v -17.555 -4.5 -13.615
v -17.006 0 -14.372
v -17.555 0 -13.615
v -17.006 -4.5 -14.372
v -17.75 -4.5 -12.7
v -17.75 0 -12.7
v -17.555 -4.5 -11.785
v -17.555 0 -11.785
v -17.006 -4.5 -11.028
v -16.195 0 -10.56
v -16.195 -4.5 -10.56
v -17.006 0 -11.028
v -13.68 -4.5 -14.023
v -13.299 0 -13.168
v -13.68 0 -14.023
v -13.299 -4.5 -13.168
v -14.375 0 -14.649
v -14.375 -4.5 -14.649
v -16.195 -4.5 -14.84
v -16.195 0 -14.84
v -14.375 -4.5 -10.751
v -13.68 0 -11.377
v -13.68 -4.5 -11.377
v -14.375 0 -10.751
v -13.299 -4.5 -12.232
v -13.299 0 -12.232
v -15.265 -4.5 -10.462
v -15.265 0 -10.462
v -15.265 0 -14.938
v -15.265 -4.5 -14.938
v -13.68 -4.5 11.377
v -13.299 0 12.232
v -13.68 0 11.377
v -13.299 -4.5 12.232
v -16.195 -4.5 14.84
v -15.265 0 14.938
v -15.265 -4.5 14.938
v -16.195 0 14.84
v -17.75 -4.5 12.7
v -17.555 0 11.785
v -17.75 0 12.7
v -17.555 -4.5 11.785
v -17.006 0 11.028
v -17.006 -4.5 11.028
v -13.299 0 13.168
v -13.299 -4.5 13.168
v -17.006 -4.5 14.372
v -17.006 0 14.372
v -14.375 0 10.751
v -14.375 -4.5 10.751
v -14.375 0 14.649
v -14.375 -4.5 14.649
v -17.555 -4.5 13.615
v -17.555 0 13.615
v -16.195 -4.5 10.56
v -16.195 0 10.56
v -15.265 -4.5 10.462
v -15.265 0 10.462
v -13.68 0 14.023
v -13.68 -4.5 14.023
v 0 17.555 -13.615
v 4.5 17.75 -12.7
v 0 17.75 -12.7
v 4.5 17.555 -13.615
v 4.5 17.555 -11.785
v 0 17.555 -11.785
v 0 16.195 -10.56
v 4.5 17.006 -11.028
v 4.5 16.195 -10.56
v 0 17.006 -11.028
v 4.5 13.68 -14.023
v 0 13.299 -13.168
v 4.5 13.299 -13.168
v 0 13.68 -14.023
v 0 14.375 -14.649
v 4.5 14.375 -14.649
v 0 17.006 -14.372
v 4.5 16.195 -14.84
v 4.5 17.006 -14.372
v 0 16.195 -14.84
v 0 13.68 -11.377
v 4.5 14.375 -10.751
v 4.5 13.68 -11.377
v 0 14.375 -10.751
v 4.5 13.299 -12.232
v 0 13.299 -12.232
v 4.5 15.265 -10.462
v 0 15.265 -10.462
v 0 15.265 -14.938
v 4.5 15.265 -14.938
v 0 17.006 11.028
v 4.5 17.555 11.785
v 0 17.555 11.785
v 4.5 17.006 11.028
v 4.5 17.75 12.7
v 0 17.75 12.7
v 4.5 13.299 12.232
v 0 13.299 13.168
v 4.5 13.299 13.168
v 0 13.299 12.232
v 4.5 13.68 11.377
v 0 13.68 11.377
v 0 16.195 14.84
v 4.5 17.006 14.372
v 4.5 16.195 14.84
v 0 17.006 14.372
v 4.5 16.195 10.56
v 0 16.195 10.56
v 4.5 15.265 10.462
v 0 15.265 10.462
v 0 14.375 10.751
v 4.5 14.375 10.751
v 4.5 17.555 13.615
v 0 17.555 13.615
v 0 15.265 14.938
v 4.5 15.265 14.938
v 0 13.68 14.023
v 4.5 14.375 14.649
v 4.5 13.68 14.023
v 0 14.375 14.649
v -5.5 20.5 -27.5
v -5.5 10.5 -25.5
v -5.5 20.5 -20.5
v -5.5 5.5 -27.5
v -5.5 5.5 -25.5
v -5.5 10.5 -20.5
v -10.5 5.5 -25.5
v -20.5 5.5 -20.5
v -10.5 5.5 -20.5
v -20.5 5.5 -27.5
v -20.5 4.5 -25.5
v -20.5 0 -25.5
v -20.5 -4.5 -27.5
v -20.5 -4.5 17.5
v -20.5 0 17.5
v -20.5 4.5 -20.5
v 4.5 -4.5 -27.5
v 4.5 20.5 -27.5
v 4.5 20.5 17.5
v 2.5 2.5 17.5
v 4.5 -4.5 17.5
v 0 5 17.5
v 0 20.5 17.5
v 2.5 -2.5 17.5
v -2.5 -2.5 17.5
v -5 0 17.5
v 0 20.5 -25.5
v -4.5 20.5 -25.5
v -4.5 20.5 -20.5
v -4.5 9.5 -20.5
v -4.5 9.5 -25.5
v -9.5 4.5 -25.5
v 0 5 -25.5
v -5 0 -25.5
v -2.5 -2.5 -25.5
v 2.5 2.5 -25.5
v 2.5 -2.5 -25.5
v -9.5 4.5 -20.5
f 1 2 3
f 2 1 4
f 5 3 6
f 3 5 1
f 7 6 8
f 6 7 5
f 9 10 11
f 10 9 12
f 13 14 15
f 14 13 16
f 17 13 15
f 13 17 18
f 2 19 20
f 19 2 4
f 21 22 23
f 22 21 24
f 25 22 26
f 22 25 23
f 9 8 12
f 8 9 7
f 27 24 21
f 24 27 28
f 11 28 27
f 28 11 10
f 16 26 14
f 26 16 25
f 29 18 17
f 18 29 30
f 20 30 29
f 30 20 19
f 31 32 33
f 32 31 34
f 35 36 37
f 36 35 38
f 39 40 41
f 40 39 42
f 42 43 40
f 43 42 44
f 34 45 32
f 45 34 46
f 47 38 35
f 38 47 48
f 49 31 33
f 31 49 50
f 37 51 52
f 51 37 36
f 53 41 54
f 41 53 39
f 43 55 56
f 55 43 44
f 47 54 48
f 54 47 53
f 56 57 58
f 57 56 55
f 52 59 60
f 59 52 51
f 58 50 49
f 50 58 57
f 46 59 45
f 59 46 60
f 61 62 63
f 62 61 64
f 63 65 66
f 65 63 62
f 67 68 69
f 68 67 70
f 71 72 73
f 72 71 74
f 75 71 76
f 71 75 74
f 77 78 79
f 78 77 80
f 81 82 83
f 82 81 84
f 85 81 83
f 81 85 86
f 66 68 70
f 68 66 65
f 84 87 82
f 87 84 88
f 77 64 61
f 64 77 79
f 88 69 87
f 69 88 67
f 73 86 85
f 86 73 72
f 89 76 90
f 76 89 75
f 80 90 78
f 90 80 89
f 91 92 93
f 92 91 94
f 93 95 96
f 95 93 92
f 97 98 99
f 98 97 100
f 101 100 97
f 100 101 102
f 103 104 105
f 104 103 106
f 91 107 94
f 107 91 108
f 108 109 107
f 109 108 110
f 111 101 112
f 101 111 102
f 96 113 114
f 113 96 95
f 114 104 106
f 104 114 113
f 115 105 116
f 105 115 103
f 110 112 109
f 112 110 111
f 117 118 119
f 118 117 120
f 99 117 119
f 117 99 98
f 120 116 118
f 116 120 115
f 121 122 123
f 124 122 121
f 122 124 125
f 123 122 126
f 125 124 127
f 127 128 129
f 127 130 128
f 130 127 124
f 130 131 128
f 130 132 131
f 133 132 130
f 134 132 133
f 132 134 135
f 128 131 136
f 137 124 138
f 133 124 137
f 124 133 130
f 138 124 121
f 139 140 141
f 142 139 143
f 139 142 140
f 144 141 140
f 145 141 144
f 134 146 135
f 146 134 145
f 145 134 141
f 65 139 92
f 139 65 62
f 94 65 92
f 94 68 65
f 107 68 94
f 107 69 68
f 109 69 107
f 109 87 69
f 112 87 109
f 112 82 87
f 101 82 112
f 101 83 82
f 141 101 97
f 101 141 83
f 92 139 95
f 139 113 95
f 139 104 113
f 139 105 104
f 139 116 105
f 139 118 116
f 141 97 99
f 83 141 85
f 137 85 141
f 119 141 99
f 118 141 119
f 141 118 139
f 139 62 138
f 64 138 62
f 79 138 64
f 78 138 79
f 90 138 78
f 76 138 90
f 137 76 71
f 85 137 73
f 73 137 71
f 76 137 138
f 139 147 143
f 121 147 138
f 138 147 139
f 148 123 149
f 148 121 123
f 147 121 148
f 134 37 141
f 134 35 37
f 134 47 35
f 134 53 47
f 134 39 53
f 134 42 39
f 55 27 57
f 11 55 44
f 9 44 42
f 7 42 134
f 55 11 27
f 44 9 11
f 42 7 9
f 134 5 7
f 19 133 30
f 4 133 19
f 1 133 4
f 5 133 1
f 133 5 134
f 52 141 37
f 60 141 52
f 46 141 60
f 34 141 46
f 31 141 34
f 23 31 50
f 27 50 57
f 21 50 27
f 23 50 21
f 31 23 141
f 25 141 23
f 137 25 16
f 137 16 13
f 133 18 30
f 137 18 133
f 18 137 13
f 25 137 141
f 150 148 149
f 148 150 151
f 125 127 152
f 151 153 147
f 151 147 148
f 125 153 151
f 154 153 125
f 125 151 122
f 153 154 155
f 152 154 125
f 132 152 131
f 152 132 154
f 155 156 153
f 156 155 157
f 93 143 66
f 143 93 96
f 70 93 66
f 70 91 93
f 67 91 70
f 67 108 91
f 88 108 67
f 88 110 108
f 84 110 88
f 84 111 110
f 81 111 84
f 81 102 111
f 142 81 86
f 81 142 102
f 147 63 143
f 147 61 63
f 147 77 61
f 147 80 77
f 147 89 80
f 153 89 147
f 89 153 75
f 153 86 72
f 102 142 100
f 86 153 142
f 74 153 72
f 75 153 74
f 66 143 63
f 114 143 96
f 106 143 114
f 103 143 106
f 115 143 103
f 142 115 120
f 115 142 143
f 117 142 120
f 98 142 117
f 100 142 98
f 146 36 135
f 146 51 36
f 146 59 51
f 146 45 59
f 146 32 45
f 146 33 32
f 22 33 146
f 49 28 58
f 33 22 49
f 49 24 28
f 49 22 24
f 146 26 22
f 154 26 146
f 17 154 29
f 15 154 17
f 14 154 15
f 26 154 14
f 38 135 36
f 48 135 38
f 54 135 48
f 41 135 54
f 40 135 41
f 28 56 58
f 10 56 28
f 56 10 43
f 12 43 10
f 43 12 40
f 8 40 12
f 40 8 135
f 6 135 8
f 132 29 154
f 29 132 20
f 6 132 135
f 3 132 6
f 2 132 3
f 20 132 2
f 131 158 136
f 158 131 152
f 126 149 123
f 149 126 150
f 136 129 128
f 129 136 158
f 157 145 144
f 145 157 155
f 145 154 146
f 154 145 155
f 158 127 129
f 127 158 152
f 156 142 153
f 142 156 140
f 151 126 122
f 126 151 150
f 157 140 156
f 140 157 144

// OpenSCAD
// file: basket.scad
$fs = 1;
$fa = 6;

rackTubeD = 9.7;
rackOD = [
    9.25 * 25.4 - rackTubeD,
    (12 + 1/32) * 25.4 - rackTubeD
];
basketOD = [
    (11 + 15/16) * 25.4,
    14 * 25.4,
    51.5
];
boxWall = 3.5;
// distance from center of rack tube to outer box wall
basketDelta = [
    (basketOD[0] - rackOD[0])/2,
    (basketOD[1] - rackOD[1])/2
];
boxFloatZ = 50;
supportThick = 4;
module rackRod(l, inflate=0) {
    cylinder(d=rackTubeD+inflate, h=l, center=true);
}
module rackRodShort(l=rackOD[0], inflate=0) {
    rotate([0, 90, 0]) rackRod(l, inflate);
}
module rackRodLong(inflate=0) {
    rotate([90, 0, 0]) rackRod(rackOD[1], inflate);
}
module moveRackLeft() {
    translate([0, -rackOD[1]/2]) children();
}
module moveRackRight() {
    rotate([0,0,180]) moveRackLeft() children();
}
module moveRackFront() {
    translate([0, -rackOD[0]/2]) children();
}
module moveBoxLeft(dist = 1) {
    translate([0, -dist * basketDelta[1]]) moveRackLeft() children();
}
module moveBoxFront(dist = 1) {
    translate([0, -dist * basketDelta[0]]) moveRackLeft() children();
}
module rack(inflate = 0) {
    moveRackRight() rackRodShort(inflate=inflate);
    moveRackLeft() rackRodShort(inflate=inflate);
    translate([rackOD[0]/2, 0]) rackRodLong(inflate=inflate);
    translate([-rackOD[0]/2, 0]) rackRodLong(inflate=inflate);
    translate([-rackOD[0]/2 - 25.4/2 - rackTubeD/2, 0]) {
        translate([0, 1.125 * 25.4 - rackTubeD/2]) rotate([0, 90, 0]) rackRod(25.4, inflate);
        translate([0, -(1.125 * 25.4 - rackTubeD/2)]) rotate([0, 90, 0]) rackRod(25.4, inflate);
        translate([-25.4/2, 0, 50]) {
            translate([0, 1.125 * 25.4 - rackTubeD/2]) rackRod(100, inflate);
            translate([0, -(1.125 * 25.4 - rackTubeD/2)]) rackRod(100, inflate);
        }
    }

}
module box(inflate=0) {
    translate([
        0,
        0,
        25 + boxFloatZ
    ]) difference() {
        cube(size=basketOD, center=true);
        cube(size=[
            basketOD[0] - 2*boxWall - inflate,
            basketOD[1] - 2*boxWall - inflate,
            basketOD[2] + 1
        ], center=true);
    }
}
module moveUpArm0(dist = 1) {
    translate([0, dist * midSupportD/2, dist * boxFloatZ]) moveBoxLeft(dist) children();
}
module moveUpArm(dist = 1, direction = 0) {
    rr = direction == 1 ? basketDelta[0] - 5.5 : basketDelta[1] - 5.5;
    straightDist = (boxFloatZ - rr);
    xyz = dist > 0.25 ? [
        0, -rr, rr + (dist - 0.25)/0.75 * straightDist
    ] : [
        0, rr * cos(-90 - dist * 360), rr + rr * sin(-90 - dist * 360)
    ];
    translate(xyz) {
        if (direction == 0) {
            moveBoxLeft(0) children();
        } else {
            moveBoxFront(0) children();
        }
    }
}

supportD = rackTubeD + supportThick*2;
midSupportD = supportD * 0.625;
wide = 15;
module basketScrews(d=3.5) {
    translate([
        0,
        0,
        boxFloatZ + (basketOD[2] - 25.4)/2
    ]) moveBoxLeft() screw(d);
    translate([
        0,
        0,
        boxFloatZ +(basketOD[2] - 25.4)/2 + 25.4 // screw holes 1" apart
    ]) moveBoxLeft() screw(d);
}
module screw(d=3.5) {
    rotate([90,0,0]) cylinder(d=d, h=100, center=true);
}
module support(direction = 0) {
    difference() {
        union() {
            for (dd=[0.0:0.05:0.25]) {
                hull() {
                    moveUpArm(direction = direction, dist = dd)
                        rotate([0, 90]) cylinder(d=supportD - (dd*2 * (supportD - midSupportD)), h=wide, center=true);
                    moveUpArm(direction = direction, dist = dd + 0.05)
                        rotate([0, 90]) cylinder(d=supportD - ((dd*2 + 0.05) * (supportD - midSupportD)), h=wide, center=true);
                }
            }
            hull() {
                moveUpArm(direction = direction, dist = 0.25)
                    rotate([0, 90]) cylinder(d=supportD - (0.5 * (supportD - midSupportD)), h=wide, center=true);

                moveUpArm(direction = direction, dist = 1)
                    rotate([0, 90]) cylinder(d=midSupportD, h=wide, center=true);

            }

            hull() {
                moveUpArm(direction = direction, dist = 1) rotate([0, 90]) cylinder(d=midSupportD, h=wide, center=true);
                translate([0, -1, basketOD[2] - supportD/4 - 5]) moveUpArm(direction = direction, dist = 1) rotate([0, 90]) cylinder(d=supportD/2, h=wide, center=true);
            }
        }
        if (direction == 0) {
            box();
            scale([1.02, 1.02, 1]) box();
        } else {
            translate([0, (basketDelta[1] - basketDelta[0]),0]) {
                box();
                scale([1.02, 1.02, 1]) box();
            }
        }
        rack(0.25);
        // screws to affix the basket
        basketScrews();

        // clip around the rack tube
        moveRackLeft() moveRackLeft() rotate([180]) {
            hull() {
                moveUpArm(direction = direction, dist = 0) rackRodShort(25, inflate=-6);
                translate([0,-10,0])
                moveUpArm(direction = direction, dist = 0) rackRodShort(25, inflate=-3);
            }
        }
        // gap that the screw will bridge
        for (dd=[0.0:0.05:0.25]) {
            hull() {
                moveUpArm(direction = direction, dist = dd)
                    rackRodShort(25, inflate=2 - rackTubeD);
                moveUpArm(direction = direction, dist = dd + 0.05)
                    rackRodShort(25, inflate=2 - rackTubeD);
            }
        }

        // screw to clamp support to rack tube
        moveUpArm(direction = direction, dist = 0.08) {
            rotate([
                -360 * 0.08,
                0,
                0
            ]) {
                translate([0, 0, -3]) rotate([-180]) {
                    // thread hole
                    translate([0,0,-12.75]) cylinder(d=3.5, h=102.75, center=false);
                    // through hole
                    translate([0,0,-4]) cylinder(d=5, h=4, center=false);
                    // m4 screw head
                    cylinder(d=8.5, h=10, center=false);

                }
                // m4 nut
                *translate([0,0,supportD/2 - 4]) cylinder(d=8.25/cos(180/6), $fn=6, h=10, center=false);


            }
        }
        // zip-tie
        *zipTieCutout();
        // bungee-hook cutout
        bungeeHookCutout(direction);

    }
}
module zipTieCutout() {
    moveRackLeft() {
        rotate([0, 90]) difference() {
            cylinder(d=supportD + 0.1, h=6, center=true);
            cylinder(d=supportD - 4, h=7, center=true);

        }
    }
}
module bungeeHookCutout(direction) {
    hull() {
        moveUpArm(direction = direction, dist = 0.25) rotate([0, 90]) cylinder(d=rackTubeD - 3, h=wide+1, center=true);
        moveUpArm(direction = direction, dist = 0.5) rotate([0, 90]) cylinder(d=rackTubeD - 4, h=wide+1, center=true);

    }
}
module screwGuide() {
    difference() {
        moveBoxLeft() hull() {
            translate([-10,0,boxFloatZ - 2]) {
                cube(size=[20, 5, basketOD[2] + 4], center=false);
                translate([-20, 5, basketOD[2]/2]) rotate([90]) cylinder(d=30, h=5, center=false);
            }
        }
        #basketScrews();
        #box();
    }
}


*for (yy=[0:25:75]) {
    translate([yy,150 + yy,0])
    rotate([0,90])
    support(0);
}

*rotate([-90]) screwGuide();

*translate([-(basketOD[1] - basketOD[0])/2,0,0]) rotate([0,0,90]) support();
//rotate([0,90])
!support(1);
*translate([rackOD[0]/2, 0, 0]) rotate([0,0,-90]) moveRackLeft() rotate([0,0,180]) support(1);
rotate([0,0,180]) translate([rackOD[0]/2, 0, 0]) rotate([0,0,-90]) moveRackLeft() rotate([0,0,180]) support(1);
%box();
%rack();
// main file
use <basket.scad>

module taper(d, h, dir) {
    taperH = (h - 35) / 2;
    hull() {
        cylinder(d=d, h=35, center=true);

        translate([dir[0] * -d/4, dir[1] * -d/4])
        cylinder(d=d/2, h=h, center=true);
    }
}

module center(d, height) {
    taper(d=5, h=height, dir=[1, 1]);
}

module base(height = 40) {
    difference() {
        translate([2.5, 2.5]) {
            hull() {
                center(5, height);
                translate([12.5, 0])
                    taper(d=5, h=height, dir=[0, 1]);
            }
            hull() {
                center(5, height);
                translate([0, 12.5])
                    taper(d=5, h=height, dir=[1, 0]);
            };
            hull() {
                center(5, height);
                translate([0, 6])
                    taper(d=5, h=height, dir=[1, 0]);
                    translate([6, 0])
                        taper(d=5, h=height, dir=[1, 0]);
            };
        }

        cylinder(d=10, $fn=4, h=100, center=true);
    }
}
module screwAssembly(d = 3.5) {
    translate([12, 0, 25.4/2])
        screw(d);

    translate([12, 0, -25.4/2])
        screw(d);
}
module moveToInside() {
    translate([3.5, 3.5]) children();
}
module reinforcement() {
    moveToInside()
    difference() {
        base();

        screwAssembly();
        rotate([0,0,90])
            screwAssembly();
    }
}

module drillGuide(args) {
    difference() {
        translate([8, 8, 5])
            cube(size=[25, 25, 45], center=true);
        translate([2.25, 12.5])
            cube(size=[4.5, 25, 51], center=true);
        translate([12.5, 2.25])
            cube(size=[25, 4.5, 51], center=true);

        translate([12.5, 12.5, -5])
            cube(size=[25, 25, 51], center=true);

        moveToInside() {
            screwAssembly(4.5);
            rotate([0,0,90])
                screwAssembly(4.5);
            translate([2, 2, -50])
            cube(size=[20, 20, 100], center=false);
        }
        translate([0,0,-24.5])
        hull() {
            cube(size=[5, 5, 100], center=true);
            translate([10,10])
            cube(size=[5, 5, 100], center=true);
        }
    }
}

reinforcement();

!rotate([0, 180])
drillGuide();
